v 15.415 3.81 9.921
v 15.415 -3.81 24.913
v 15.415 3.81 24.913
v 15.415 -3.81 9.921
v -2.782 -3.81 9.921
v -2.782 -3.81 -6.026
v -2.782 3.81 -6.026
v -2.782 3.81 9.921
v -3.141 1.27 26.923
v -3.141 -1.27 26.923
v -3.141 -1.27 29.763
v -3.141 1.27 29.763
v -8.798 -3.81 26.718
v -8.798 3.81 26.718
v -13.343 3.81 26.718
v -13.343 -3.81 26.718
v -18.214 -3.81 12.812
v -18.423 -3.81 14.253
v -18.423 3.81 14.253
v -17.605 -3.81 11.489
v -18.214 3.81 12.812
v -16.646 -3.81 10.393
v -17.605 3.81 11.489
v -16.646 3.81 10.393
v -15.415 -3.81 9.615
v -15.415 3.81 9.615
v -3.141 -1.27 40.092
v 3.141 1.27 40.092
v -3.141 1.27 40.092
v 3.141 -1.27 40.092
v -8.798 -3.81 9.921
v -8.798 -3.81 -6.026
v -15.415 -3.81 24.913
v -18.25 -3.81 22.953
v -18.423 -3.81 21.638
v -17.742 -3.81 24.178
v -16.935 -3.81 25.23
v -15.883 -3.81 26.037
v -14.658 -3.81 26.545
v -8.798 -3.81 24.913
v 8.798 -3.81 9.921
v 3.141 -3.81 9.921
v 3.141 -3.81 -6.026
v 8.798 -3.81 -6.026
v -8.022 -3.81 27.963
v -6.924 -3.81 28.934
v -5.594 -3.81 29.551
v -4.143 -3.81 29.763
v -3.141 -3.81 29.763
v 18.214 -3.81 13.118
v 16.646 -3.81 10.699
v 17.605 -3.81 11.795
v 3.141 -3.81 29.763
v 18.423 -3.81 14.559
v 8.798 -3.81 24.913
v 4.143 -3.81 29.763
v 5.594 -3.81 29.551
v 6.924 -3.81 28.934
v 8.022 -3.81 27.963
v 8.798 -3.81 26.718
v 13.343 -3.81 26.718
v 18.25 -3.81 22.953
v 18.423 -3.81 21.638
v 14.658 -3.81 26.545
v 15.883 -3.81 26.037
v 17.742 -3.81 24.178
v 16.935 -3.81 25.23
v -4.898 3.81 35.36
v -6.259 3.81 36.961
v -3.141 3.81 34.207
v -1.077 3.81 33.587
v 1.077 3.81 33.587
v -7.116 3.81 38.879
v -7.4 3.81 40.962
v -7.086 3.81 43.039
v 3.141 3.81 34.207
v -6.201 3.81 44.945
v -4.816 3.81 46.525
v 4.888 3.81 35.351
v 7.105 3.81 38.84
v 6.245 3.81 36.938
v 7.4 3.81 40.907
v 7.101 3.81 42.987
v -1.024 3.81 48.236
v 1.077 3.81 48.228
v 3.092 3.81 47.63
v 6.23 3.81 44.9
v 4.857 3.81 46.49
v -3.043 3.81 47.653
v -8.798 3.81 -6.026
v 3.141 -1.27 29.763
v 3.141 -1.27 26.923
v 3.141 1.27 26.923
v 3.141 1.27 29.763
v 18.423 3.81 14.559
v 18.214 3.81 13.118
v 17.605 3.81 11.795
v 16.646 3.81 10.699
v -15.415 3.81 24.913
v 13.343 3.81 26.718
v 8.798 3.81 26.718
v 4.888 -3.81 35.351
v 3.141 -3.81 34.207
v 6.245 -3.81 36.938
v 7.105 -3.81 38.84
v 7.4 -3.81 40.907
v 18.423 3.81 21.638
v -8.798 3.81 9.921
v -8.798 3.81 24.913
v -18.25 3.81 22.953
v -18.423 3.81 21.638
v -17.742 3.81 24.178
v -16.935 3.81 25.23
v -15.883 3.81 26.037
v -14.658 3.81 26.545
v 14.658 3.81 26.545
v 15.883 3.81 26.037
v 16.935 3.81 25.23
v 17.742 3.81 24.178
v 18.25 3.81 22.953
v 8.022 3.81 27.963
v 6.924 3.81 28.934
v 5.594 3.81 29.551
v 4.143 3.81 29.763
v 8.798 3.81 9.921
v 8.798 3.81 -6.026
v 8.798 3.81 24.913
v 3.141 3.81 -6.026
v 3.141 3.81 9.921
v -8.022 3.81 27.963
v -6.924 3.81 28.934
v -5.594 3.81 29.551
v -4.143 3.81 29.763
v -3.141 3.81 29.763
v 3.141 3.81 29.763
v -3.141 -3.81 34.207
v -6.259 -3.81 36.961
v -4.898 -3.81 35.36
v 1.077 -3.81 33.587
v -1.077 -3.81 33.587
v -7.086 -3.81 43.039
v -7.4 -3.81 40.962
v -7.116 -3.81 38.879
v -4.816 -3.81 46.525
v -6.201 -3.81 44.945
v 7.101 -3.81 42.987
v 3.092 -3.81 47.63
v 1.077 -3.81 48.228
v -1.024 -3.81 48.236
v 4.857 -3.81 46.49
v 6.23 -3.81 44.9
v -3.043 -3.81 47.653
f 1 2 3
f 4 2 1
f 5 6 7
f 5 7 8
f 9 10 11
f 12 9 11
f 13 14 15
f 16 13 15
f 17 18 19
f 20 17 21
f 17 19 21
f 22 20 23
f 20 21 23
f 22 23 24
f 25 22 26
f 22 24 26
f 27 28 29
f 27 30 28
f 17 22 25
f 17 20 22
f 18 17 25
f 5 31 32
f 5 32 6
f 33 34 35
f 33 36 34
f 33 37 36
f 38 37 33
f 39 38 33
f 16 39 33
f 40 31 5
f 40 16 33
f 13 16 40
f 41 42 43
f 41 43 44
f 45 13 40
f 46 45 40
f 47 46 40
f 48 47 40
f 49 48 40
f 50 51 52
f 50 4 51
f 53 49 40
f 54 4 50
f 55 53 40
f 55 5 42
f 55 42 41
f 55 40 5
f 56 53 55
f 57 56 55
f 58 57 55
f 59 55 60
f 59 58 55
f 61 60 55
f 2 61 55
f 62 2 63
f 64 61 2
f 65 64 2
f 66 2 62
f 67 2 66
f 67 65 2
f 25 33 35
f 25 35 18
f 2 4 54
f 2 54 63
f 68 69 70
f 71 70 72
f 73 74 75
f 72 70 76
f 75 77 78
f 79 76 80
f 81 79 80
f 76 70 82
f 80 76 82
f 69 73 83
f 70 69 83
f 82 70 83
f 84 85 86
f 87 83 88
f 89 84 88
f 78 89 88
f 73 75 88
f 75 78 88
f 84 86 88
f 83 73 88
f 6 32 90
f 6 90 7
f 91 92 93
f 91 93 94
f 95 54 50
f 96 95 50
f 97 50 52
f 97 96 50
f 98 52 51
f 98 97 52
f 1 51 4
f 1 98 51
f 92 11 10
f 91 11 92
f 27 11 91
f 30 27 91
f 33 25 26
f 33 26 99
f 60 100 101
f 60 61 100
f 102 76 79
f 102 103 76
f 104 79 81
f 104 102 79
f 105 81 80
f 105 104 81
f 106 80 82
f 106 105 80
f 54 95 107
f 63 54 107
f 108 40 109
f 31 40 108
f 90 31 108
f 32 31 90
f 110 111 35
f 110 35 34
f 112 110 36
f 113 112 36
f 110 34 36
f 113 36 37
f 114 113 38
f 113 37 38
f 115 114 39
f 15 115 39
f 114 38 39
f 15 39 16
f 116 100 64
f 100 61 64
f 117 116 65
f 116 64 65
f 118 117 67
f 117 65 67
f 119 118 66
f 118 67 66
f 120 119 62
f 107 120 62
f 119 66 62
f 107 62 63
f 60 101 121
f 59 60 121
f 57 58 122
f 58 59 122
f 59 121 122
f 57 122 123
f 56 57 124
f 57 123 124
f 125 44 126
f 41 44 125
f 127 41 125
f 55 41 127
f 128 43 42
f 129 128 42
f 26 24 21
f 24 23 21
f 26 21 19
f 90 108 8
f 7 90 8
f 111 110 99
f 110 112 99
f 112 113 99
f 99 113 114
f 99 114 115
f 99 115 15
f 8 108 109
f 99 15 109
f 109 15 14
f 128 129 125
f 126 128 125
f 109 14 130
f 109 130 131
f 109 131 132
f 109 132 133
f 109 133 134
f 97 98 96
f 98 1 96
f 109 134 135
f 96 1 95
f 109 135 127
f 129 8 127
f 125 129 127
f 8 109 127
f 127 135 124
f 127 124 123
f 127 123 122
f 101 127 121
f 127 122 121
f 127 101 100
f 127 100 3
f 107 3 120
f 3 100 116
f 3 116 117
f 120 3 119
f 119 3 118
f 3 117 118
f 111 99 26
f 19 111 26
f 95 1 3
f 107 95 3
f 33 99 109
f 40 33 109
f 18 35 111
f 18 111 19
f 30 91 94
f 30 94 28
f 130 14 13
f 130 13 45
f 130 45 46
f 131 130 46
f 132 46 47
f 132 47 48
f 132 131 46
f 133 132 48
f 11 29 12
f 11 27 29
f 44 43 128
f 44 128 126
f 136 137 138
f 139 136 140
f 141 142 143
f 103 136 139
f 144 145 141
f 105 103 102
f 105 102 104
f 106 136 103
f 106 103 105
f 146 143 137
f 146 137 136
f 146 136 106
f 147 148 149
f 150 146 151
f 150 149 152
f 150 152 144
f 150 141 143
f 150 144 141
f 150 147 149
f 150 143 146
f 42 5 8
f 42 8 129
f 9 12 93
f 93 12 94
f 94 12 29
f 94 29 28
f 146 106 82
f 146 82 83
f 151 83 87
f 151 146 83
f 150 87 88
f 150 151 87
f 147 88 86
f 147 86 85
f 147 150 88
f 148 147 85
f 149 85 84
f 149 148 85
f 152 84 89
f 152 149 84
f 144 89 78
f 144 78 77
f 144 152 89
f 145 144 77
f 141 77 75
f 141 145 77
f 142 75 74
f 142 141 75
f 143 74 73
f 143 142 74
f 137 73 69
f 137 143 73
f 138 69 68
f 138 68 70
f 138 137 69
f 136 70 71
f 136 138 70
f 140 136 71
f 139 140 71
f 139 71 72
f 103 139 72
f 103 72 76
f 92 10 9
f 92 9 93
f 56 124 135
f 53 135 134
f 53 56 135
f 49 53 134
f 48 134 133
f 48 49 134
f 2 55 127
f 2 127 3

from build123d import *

# Parameters (mm, degrees)
F0_W        = 6.0157910921
F0_H        = 15.9466497103
F0_W_2      = 6.6173858
F0_H_2      = 1.8047373742
F0_W_3      = 6.6173737869
F0_W_4      = 5.6565788109
F0_W_5      = 6.2819751911
F0_H_3      = 2.8401233753
F1_DEPTH    = 3.81
F2_DEPTH    = 1.27
F3_R        = 5.08
F4_T1_DEPTH = 30.8109306563
F4_T3_DEPTH = 30.8109326237
F5_T1_DEPTH = 30.8932363866


# Not quite as in the source:
# - a fillet or chamfer that OpenCascade refuses, or shapes differently, is made with other operations: its cross-section is extruded or revolved along the edge and cut away or added


with BuildPart() as f1:
    # F0 (on Front) → F1 (new body, symmetric)
    with BuildSketch(Plane.XZ):
        Polygon((-3.1409875955, 26.922961697), (-3.1409875955, 29.7630850723), (-8.7975664064, 29.7630850723), (-8.7975664064, 26.7179459333), (-8.7975664064, 24.9132085592), (-8.7975664064, 9.9205921838), (-2.7817753144, 9.9205921838), (3.1409875955, 9.9205921838), (8.7975664064, 9.9205921838), (8.7975664064, 24.9132085592), (8.7975664064, 26.7179459333), (8.7975664064, 29.7630850723), (3.1409875955, 29.7630850723), (3.1409875955, 26.922961697), align=None)
        with Locations((-5.7896708604, 1.9472673287)):
            Rectangle(F0_W, F0_H)
        Polygon((-15.4149522064, 24.9132085592), (-15.4149522064, 26.7179459333), (-18.4228456064, 26.7179459333), (-18.4228456064, 9.6149956807), (-15.4149522064, 9.6149956807), align=None)
        with Locations((-12.1062593064, 25.8155772462)):
            Rectangle(F0_W_2, F0_H_2)
        Polygon((18.4228327125, 26.7179459333), (15.4149401933, 26.7179459333), (15.4149401933, 24.9132085592), (15.4149401933, 9.9205921838), (18.4228327125, 9.9205921838), align=None)
        with Locations((12.1062532999, 25.8155772462)):
            Rectangle(F0_W_3, F0_H_2)
        with Locations((5.969277001, 1.9472673287)):
            Rectangle(F0_W_4, F0_H)
        with Locations((0, 28.3430233846)):
            Rectangle(F0_W_5, F0_H_3)
    extrude(amount=F1_DEPTH, both=True)

    # F3
    f3_edges = [f1.edges().sort_by_distance(p)[0] for p in [
        (-18.422846, 0, 26.717946),
        (18.422833, 0, 26.717946),
    ]]
    fillet(f3_edges, radius=F3_R)

    # F4: fillet of radius 5.08 on 2 edges, made by hand

    # F4_s2 → F4_t1 (cut)
    with BuildSketch(Plane.XZ.offset(-15.4054653281)):
        with BuildLine():
            ThreePointArc((18.4228327125, 14.558778315), (17.6050332007, 11.794714821), (15.4149401933, 9.9205921838))
            Line((15.4149401933, 9.9205921838), (18.4228327125, 9.9205921838))
            Line((18.4228327125, 9.9205921838), (18.4228327125, 14.558778315))
        make_face()
    extrude(amount=F4_T1_DEPTH, mode=Mode.SUBTRACT)

    # F4_s4 → F4_t3 (cut)
    with BuildSketch(Plane.XZ.offset(-15.4054663118)):
        with BuildLine():
            ThreePointArc((-18.4228456064, 14.2531822055), (-17.6050458321, 11.4891183068), (-15.4149522064, 9.6149956807))
            Line((-15.4149522064, 9.6149956807), (-18.4228456064, 9.6149956807))
            Line((-18.4228456064, 9.6149956807), (-18.4228456064, 14.2531822055))
        make_face()
    extrude(amount=F4_T3_DEPTH, mode=Mode.SUBTRACT)

    # F5: fillet of radius 5.08 on 2 edges, made by hand

    # F5_s2 → F5_t1 (cut)
    with BuildSketch(Plane.XZ.offset(-15.4466181933)):
        with BuildLine():
            ThreePointArc((8.7975664064, 26.7179459333), (6.9240436163, 28.9341727669), (4.1429191291, 29.7630850723))
            Line((4.1429191291, 29.7630850723), (8.7975664064, 29.7630850723))
            Line((8.7975664064, 29.7630850723), (8.7975664064, 26.7179459333))
        make_face()
        with BuildLine():
            ThreePointArc((-8.7975664064, 26.7179459333), (-6.9240436163, 28.9341727669), (-4.1429191291, 29.7630850723))
            Line((-4.1429191291, 29.7630850723), (-8.7975664064, 29.7630850723))
            Line((-8.7975664064, 29.7630850723), (-8.7975664064, 26.7179459333))
        make_face()
    extrude(amount=F5_T1_DEPTH, mode=Mode.SUBTRACT)


with BuildPart() as f1b:
    # F0 (on Front) → F1, piece 2 (new body, symmetric)
    with BuildSketch(Plane.XZ):
        with BuildLine():
            ThreePointArc((3.1409875955, 34.2073870963), (6.2449143868, 36.9379106269), (7.3996991859, 40.9073680639))
            ThreePointArc((7.3996991859, 40.9073680639), (-3.969457437, 47.1522824507), (-3.1409875955, 34.2073870963))
            Line((-3.1409875955, 34.2073870963), (-3.1409875955, 40.092376059))
            Line((-3.1409875955, 40.092376059), (3.1409875955, 40.092376059))
            Line((3.1409875955, 40.092376059), (3.1409875955, 34.2073870963))
        make_face()
        with BuildLine():
            Line((-3.1409875955, 40.092376059), (-3.1409875955, 34.2073870963))
            ThreePointArc((-3.1409875955, 34.2073870963), (0, 33.507668878), (3.1409875955, 34.2073870963))
            Line((3.1409875955, 34.2073870963), (3.1409875955, 40.092376059))
            Line((3.1409875955, 40.092376059), (-3.1409875955, 40.092376059))
        make_face()
    extrude(amount=F1_DEPTH, both=True)


with BuildPart() as f2:
    # F0 (on Front) → F2 (new body, symmetric)
    with BuildSketch(Plane.XZ):
        with Locations((0, 28.3430233846)):
            Rectangle(F0_W_5, F0_H_3)
        with BuildLine():
            ThreePointArc((3.1409875955, 34.2073870963), (0, 33.507668878), (-3.1409875955, 34.2073870963))
            Line((-3.1409875955, 34.2073870963), (-3.1409875955, 29.7630850723))
            Line((-3.1409875955, 29.7630850723), (3.1409875955, 29.7630850723))
            Line((3.1409875955, 29.7630850723), (3.1409875955, 34.2073870963))
        make_face()
        with BuildLine():
            Line((-3.1409875955, 40.092376059), (-3.1409875955, 34.2073870963))
            ThreePointArc((-3.1409875955, 34.2073870963), (0, 33.507668878), (3.1409875955, 34.2073870963))
            Line((3.1409875955, 34.2073870963), (3.1409875955, 40.092376059))
            Line((3.1409875955, 40.092376059), (-3.1409875955, 40.092376059))
        make_face()
    extrude(amount=F2_DEPTH, both=True)


solid = Compound([f1.part, f1b.part, f2.part])
